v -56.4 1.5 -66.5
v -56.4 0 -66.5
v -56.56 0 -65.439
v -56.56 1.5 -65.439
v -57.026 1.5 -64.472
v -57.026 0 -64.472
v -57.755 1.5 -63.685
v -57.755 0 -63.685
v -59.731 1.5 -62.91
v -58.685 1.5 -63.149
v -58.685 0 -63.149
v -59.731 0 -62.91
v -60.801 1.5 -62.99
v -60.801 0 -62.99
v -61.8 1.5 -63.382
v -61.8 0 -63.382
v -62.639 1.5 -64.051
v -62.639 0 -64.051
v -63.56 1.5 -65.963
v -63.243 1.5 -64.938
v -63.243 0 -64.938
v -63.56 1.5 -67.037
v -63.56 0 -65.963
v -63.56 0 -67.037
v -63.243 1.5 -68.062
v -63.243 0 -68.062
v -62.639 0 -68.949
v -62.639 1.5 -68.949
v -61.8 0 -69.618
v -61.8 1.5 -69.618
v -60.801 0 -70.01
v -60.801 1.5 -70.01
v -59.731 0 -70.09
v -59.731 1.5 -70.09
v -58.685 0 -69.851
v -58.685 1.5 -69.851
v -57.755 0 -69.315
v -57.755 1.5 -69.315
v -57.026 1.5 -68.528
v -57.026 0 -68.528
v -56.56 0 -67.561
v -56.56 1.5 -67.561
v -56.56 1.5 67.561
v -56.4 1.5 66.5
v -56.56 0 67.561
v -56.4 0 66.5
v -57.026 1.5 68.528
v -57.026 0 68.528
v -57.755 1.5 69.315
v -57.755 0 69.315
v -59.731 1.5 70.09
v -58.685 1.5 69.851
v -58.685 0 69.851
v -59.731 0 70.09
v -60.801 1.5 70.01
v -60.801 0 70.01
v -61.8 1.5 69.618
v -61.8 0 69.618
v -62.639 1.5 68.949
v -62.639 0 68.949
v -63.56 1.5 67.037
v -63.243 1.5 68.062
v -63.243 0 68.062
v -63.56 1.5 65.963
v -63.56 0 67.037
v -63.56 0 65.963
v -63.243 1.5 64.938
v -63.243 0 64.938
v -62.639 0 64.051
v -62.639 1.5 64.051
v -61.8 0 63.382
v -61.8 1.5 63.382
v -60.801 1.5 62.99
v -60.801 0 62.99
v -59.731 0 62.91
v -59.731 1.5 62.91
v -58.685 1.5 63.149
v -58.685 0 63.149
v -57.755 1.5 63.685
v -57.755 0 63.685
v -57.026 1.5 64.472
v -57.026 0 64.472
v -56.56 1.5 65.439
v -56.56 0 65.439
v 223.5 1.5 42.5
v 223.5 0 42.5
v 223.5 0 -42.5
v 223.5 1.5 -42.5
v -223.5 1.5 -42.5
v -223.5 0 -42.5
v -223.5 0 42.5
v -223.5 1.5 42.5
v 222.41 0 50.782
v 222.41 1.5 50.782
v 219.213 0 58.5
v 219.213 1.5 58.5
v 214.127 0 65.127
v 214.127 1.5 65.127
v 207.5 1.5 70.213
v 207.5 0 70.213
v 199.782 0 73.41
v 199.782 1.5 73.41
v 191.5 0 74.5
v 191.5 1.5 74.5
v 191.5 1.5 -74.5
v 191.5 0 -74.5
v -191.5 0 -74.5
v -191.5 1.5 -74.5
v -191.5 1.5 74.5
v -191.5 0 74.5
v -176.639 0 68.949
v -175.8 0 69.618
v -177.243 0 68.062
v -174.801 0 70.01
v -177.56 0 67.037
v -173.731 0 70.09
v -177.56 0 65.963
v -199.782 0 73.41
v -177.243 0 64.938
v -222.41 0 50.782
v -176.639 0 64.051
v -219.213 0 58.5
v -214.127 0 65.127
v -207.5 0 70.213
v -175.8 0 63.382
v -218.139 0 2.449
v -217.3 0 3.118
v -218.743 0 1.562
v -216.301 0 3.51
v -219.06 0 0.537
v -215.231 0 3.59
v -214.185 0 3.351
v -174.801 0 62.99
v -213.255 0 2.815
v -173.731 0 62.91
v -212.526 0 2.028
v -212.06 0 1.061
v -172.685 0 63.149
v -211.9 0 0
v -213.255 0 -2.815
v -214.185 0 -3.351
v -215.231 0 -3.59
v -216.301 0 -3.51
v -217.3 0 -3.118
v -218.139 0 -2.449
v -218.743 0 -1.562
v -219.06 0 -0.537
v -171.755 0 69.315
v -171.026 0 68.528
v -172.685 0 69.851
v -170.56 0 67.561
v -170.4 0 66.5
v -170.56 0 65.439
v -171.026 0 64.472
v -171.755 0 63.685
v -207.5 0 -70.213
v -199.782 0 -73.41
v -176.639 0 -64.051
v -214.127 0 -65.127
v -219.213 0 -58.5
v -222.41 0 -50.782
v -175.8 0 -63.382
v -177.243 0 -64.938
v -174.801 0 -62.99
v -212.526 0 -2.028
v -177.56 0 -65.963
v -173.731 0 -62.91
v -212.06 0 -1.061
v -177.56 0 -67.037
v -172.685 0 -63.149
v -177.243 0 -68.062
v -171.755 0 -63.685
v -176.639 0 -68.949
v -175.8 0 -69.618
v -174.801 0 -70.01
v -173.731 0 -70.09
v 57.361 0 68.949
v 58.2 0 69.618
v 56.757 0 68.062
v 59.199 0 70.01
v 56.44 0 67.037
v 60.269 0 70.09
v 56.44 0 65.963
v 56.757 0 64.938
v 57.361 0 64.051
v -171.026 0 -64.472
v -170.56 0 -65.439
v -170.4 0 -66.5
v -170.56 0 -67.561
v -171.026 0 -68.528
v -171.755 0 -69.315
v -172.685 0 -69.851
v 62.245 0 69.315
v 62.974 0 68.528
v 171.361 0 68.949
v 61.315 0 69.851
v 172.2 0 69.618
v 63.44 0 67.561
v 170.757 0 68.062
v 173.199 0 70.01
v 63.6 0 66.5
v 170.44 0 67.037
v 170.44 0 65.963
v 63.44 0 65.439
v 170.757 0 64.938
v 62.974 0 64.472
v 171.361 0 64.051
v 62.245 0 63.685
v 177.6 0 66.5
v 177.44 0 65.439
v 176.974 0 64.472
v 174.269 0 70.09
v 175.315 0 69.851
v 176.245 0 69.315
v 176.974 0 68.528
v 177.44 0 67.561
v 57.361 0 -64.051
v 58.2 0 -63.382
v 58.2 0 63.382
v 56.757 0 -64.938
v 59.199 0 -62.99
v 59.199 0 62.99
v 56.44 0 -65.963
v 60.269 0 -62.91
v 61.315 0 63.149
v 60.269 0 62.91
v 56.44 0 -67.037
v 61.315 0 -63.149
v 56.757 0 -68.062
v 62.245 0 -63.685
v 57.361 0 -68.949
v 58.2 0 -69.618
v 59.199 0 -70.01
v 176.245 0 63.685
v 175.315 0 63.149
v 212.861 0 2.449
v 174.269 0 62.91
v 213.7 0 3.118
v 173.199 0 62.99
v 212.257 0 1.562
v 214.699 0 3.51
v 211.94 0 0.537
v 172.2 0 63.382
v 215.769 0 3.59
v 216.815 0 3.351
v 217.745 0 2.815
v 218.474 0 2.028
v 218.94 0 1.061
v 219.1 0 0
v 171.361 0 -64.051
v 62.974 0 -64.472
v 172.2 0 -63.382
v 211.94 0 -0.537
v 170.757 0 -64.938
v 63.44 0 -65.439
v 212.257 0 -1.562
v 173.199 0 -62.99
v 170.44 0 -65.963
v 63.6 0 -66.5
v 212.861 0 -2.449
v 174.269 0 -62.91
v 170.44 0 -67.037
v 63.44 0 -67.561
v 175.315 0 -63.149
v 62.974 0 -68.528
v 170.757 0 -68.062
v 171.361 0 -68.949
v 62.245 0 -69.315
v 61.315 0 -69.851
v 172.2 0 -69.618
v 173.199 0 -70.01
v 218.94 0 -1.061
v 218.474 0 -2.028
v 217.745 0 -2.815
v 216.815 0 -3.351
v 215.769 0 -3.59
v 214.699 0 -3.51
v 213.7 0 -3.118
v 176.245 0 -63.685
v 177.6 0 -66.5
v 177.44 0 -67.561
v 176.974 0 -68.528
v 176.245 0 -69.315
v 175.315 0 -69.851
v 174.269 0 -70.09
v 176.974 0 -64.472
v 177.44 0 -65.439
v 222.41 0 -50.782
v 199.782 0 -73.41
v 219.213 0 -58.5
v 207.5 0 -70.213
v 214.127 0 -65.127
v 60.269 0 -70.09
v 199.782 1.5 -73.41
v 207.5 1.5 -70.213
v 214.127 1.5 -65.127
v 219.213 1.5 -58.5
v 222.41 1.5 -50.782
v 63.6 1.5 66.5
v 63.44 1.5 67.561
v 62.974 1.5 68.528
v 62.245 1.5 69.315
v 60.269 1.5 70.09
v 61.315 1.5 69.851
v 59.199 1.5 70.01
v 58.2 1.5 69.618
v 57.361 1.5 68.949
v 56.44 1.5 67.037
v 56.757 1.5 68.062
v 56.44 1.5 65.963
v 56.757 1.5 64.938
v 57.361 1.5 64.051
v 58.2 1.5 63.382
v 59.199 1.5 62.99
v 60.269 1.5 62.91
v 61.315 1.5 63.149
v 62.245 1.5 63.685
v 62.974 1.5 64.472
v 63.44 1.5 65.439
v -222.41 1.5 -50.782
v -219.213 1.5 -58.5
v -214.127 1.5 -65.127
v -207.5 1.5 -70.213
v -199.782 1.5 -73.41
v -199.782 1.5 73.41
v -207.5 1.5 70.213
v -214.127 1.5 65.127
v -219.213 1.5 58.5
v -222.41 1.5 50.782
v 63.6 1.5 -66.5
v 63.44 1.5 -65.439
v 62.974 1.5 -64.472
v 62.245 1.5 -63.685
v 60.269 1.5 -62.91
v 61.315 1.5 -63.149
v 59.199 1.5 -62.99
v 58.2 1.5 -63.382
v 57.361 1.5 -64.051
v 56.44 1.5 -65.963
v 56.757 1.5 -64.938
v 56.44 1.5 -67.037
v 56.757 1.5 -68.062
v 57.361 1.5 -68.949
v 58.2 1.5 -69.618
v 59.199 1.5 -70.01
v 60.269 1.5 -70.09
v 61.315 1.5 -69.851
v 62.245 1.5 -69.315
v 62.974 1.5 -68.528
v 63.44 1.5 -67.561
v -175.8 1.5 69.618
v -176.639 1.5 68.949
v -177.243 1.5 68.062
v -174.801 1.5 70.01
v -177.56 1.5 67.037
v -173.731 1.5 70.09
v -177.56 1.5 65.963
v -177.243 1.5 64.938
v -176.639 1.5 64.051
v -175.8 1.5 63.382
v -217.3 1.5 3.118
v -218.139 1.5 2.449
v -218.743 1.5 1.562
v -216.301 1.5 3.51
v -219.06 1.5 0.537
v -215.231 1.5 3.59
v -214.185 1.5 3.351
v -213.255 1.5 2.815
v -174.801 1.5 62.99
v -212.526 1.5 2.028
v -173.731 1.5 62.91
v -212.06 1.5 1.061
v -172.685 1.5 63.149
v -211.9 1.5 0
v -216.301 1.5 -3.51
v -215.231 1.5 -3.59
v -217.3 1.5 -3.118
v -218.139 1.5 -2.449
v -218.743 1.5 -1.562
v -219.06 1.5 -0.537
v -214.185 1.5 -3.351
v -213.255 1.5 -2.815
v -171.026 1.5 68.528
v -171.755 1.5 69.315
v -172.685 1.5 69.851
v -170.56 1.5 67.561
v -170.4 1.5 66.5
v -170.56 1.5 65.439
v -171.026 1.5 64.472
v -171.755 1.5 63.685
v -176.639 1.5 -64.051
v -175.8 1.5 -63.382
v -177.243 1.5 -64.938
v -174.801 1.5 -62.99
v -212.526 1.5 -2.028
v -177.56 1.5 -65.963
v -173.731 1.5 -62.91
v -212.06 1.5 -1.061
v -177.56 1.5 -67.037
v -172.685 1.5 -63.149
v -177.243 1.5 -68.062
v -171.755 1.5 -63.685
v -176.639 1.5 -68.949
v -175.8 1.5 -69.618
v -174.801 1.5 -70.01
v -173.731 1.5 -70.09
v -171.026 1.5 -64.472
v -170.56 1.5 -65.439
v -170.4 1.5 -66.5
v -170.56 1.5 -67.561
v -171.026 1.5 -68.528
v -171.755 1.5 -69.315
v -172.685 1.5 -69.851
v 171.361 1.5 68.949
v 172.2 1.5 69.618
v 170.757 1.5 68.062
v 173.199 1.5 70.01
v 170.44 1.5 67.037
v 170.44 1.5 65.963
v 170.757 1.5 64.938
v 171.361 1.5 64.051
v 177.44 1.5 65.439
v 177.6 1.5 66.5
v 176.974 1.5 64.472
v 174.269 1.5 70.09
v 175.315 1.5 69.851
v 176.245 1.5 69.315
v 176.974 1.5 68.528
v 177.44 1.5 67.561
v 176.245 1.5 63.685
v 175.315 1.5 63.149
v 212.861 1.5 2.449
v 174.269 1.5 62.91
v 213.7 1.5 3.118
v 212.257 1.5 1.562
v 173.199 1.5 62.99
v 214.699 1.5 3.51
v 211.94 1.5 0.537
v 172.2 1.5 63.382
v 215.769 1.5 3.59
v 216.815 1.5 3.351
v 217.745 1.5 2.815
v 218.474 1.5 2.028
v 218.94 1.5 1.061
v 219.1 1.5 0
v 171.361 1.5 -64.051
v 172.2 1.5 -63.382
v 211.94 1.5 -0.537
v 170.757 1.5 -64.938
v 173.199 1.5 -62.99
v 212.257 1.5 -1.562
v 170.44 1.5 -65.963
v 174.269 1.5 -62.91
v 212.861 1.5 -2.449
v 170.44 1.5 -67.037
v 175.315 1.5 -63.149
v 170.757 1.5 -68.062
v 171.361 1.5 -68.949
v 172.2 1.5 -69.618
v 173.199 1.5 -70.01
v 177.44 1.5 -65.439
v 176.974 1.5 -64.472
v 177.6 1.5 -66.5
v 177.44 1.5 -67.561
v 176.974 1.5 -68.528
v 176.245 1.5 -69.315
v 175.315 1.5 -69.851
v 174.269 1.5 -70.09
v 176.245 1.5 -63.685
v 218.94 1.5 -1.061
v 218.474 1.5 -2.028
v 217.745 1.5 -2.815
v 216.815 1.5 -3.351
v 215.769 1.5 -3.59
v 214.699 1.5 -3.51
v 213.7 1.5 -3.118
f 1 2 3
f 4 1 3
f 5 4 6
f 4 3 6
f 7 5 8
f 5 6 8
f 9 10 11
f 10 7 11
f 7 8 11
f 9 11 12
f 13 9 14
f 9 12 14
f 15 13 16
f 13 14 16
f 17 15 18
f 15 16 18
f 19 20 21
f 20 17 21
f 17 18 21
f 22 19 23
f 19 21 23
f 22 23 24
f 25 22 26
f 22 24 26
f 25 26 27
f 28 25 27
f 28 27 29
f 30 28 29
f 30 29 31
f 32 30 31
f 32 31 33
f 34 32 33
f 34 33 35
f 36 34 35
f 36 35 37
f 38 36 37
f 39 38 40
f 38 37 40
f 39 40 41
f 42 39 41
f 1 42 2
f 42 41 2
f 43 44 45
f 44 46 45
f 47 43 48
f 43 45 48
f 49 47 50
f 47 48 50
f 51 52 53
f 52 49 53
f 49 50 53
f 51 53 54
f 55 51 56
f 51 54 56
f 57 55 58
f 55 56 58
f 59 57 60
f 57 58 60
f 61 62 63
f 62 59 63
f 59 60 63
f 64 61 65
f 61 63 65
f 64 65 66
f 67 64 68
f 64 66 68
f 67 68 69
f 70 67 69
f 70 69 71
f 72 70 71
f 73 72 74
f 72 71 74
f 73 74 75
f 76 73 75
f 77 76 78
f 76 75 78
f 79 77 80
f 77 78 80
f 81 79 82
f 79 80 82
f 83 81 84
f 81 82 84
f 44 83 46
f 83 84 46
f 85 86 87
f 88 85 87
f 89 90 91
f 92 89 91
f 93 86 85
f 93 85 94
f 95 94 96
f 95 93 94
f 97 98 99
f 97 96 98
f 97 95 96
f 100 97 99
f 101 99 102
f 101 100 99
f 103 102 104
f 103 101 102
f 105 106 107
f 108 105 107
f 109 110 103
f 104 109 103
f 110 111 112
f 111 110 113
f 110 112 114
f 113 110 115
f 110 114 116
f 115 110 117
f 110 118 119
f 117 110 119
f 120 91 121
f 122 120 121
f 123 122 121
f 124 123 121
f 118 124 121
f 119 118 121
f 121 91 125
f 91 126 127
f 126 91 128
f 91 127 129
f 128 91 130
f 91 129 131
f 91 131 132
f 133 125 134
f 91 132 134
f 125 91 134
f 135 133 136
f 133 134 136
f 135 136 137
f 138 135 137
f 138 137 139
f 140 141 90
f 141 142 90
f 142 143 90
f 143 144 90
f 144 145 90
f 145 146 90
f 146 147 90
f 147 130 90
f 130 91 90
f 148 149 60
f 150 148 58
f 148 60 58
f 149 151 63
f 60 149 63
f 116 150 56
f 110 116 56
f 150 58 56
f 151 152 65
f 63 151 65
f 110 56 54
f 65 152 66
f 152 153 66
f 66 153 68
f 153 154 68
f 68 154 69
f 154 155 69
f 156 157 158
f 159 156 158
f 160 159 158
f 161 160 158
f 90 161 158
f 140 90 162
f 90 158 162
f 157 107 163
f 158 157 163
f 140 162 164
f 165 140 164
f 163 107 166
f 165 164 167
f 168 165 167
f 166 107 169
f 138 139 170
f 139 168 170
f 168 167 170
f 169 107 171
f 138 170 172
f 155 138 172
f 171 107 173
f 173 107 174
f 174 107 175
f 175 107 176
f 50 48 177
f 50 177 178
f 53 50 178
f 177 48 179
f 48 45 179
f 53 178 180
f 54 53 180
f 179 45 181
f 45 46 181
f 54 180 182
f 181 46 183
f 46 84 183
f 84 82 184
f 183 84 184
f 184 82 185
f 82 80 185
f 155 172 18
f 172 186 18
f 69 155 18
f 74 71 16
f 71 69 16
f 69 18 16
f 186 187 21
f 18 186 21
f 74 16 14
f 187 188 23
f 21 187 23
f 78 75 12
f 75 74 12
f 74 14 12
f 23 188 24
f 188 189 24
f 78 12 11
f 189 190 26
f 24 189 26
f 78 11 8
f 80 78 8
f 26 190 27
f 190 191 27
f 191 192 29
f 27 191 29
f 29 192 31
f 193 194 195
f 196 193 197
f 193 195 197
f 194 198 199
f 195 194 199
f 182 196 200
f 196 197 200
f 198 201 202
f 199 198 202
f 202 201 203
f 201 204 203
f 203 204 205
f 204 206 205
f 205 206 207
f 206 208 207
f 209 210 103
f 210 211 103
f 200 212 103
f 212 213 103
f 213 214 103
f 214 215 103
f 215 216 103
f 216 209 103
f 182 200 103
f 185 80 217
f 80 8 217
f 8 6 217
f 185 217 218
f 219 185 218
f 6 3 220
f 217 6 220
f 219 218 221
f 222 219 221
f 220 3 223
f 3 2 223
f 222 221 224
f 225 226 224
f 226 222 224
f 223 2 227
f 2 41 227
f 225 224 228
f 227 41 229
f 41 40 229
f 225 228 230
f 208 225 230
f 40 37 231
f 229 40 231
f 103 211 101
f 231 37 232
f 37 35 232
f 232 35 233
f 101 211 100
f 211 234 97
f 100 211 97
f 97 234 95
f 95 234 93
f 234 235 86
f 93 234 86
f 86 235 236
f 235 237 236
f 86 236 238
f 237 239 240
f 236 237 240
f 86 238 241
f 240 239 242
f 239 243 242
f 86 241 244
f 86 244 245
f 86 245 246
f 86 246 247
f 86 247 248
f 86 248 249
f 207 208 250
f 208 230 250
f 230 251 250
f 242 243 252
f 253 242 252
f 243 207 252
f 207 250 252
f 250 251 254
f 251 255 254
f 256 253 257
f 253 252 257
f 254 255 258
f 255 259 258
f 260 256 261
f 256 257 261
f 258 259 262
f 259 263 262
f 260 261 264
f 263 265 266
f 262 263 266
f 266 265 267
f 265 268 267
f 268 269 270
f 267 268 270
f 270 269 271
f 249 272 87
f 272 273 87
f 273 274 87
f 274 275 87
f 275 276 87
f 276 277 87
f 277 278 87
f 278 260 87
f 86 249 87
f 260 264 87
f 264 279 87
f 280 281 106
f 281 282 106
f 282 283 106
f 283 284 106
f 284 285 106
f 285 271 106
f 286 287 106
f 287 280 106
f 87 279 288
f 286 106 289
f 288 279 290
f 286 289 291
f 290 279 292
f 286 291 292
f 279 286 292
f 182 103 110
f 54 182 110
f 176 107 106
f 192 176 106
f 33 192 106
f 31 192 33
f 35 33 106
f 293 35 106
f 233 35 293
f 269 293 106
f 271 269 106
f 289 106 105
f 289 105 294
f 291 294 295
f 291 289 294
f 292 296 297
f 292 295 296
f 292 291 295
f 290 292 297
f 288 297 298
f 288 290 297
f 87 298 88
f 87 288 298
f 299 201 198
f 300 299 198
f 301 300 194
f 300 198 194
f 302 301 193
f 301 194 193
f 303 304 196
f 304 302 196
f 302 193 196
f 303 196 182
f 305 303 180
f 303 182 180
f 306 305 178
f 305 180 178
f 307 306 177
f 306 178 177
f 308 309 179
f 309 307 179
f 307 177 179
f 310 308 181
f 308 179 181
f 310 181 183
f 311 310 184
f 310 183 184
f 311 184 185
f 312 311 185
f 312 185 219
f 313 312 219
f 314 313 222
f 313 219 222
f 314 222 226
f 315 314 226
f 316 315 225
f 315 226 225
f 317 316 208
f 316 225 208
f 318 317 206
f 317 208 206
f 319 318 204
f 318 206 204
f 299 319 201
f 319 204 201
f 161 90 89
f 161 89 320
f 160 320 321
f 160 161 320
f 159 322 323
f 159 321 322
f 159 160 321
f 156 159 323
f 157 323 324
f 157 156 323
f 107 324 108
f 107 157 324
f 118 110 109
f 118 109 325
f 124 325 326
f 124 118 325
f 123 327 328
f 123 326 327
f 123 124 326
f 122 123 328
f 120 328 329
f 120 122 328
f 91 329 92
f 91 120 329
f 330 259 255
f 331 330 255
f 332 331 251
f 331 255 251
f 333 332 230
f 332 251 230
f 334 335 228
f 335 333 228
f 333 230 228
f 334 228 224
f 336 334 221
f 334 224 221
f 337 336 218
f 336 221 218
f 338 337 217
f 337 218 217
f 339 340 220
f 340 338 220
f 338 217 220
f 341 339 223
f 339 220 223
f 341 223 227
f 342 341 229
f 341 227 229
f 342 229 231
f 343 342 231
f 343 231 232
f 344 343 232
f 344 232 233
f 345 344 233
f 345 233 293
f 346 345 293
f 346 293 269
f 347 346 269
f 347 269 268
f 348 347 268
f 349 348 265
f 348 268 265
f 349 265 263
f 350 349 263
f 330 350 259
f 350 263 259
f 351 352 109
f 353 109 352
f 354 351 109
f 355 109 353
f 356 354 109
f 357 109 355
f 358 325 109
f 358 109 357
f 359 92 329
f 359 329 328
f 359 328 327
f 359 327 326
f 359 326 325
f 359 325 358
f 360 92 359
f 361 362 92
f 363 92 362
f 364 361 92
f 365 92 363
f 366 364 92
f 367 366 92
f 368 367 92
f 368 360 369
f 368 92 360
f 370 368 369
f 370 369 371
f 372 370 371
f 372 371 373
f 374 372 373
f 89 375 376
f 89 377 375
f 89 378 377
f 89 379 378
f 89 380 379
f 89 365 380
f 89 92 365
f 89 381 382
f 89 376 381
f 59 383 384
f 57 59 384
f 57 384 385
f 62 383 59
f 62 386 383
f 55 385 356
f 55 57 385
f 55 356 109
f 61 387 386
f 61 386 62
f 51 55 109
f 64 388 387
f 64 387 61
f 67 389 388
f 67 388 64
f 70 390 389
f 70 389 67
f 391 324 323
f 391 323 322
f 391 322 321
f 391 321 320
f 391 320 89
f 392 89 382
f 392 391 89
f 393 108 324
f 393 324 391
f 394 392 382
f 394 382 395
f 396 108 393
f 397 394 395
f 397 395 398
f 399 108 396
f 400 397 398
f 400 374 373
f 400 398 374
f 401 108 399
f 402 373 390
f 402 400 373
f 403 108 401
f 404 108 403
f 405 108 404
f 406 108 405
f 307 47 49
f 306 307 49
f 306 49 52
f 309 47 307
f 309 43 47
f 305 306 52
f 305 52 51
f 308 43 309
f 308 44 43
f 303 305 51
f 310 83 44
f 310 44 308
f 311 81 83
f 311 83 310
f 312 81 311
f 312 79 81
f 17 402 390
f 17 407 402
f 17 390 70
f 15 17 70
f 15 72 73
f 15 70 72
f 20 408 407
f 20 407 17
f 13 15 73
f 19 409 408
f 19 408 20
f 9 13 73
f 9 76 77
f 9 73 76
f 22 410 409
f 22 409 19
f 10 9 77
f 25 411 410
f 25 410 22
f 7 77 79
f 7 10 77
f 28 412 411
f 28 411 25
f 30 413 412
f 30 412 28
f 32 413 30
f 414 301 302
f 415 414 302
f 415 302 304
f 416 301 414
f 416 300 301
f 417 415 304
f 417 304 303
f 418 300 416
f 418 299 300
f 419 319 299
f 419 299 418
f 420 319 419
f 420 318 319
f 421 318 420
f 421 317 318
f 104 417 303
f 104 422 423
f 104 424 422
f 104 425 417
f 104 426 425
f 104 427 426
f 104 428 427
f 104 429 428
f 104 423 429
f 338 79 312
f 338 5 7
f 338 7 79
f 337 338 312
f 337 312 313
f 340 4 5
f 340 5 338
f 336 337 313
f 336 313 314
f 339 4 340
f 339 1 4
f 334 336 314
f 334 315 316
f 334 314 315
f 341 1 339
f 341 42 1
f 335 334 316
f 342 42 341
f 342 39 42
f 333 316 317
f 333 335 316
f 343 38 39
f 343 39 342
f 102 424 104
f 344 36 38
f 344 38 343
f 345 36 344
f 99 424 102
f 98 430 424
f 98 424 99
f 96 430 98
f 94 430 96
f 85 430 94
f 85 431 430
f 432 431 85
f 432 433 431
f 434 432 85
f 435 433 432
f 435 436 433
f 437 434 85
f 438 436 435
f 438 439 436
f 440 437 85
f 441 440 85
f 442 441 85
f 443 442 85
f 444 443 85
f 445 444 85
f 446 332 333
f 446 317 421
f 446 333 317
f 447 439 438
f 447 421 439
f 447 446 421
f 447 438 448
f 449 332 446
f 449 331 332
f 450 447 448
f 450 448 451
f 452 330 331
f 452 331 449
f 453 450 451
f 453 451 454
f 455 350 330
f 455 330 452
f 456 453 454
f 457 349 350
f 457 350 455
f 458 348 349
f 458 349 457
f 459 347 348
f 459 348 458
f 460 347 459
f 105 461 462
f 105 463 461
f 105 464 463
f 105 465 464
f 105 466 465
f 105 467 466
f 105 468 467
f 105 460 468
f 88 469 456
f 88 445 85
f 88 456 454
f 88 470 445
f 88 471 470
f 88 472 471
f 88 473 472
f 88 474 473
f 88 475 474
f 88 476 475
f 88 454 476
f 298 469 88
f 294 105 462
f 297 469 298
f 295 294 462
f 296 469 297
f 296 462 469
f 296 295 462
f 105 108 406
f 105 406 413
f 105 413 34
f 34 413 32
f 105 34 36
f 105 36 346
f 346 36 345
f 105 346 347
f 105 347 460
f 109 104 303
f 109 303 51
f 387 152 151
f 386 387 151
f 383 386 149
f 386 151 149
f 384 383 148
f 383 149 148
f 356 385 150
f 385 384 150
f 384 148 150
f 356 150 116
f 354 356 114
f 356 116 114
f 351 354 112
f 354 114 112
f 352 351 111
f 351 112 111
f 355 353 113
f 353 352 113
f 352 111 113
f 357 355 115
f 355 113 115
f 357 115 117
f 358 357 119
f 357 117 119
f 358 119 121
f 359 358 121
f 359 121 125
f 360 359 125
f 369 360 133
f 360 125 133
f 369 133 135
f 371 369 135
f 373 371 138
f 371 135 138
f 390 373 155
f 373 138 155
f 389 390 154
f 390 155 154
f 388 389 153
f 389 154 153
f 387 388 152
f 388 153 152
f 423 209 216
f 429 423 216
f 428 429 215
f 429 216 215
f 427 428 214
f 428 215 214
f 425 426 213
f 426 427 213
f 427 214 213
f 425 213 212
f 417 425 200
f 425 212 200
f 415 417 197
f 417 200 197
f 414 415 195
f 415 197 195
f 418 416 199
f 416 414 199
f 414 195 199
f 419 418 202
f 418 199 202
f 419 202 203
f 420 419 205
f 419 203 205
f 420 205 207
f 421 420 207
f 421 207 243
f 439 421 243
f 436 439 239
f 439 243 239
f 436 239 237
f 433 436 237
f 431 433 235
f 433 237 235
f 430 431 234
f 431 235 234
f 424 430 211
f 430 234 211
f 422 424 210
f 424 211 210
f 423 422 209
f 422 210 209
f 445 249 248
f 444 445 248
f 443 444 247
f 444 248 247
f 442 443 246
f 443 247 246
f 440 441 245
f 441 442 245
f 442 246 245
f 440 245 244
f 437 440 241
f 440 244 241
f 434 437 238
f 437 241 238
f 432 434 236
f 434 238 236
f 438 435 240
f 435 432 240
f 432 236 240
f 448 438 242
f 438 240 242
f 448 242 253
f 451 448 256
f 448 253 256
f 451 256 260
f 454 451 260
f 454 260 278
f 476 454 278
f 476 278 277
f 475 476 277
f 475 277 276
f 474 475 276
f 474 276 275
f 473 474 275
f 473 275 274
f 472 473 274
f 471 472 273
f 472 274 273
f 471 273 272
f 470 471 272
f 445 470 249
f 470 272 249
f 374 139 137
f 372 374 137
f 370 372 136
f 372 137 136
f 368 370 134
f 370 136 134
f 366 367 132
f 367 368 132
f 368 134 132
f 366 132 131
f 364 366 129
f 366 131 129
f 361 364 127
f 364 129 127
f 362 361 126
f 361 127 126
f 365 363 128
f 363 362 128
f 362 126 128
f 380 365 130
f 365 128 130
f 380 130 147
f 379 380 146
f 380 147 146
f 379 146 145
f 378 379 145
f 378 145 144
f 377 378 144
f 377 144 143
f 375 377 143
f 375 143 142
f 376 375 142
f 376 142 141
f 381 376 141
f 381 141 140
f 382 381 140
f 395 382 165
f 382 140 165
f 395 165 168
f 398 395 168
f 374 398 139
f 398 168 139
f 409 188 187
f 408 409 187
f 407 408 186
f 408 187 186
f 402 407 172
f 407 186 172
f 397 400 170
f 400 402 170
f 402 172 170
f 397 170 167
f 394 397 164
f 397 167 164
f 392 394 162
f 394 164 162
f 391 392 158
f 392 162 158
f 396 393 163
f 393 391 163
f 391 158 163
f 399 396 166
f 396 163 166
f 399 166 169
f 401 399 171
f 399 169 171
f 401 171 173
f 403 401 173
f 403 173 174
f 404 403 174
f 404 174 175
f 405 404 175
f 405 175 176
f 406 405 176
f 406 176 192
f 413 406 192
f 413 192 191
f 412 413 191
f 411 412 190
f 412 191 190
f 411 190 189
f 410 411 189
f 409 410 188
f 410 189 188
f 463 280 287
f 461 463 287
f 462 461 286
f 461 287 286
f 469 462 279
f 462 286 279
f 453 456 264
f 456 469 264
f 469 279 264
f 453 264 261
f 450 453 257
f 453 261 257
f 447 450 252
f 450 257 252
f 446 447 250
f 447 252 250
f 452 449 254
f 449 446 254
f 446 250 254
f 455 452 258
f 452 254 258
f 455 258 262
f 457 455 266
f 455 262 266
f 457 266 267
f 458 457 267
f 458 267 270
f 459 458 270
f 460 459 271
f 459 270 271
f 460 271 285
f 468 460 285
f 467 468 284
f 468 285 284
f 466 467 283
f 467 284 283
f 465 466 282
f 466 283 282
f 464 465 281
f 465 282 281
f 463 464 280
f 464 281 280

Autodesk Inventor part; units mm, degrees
sketch "Sketch_4" plane through (0, 0, 0) normal (0, 1, 0) x (1, 0, 0)
  arc A0 (-223.5, -42.5) -> (-191.5, -74.5) centre (-191.5, -42.5) ccw
  line L0 (-191.5, -74.5) -> (191.5, -74.5)
  arc A1 (191.5, -74.5) -> (223.5, -42.5) centre (191.5, -42.5) ccw
  line L1 (223.5, -42.5) -> (223.5, 42.5)
  arc A2 (223.5, 42.5) -> (191.5, 74.5) centre (191.5, 42.5) ccw
  line L2 (191.5, 74.5) -> (-191.5, 74.5)
  arc A3 (-191.5, 74.5) -> (-223.5, 42.5) centre (-191.5, 42.5) ccw
  line L3 (-223.5, 42.5) -> (-223.5, -42.5)
  circle A4 centre (215.5, 0) radius 3.6
  circle A5 centre (174, -66.5) radius 3.6
  circle A6 centre (174, 66.5) radius 3.6
  circle A7 centre (60, -66.5) radius 3.6
  circle A8 centre (60, 66.5) radius 3.6
  circle A9 centre (-60, -66.5) radius 3.6
  circle A10 centre (-60, 66.5) radius 3.6
  circle A11 centre (-174, -66.5) radius 3.6
  circle A12 centre (-174, 66.5) radius 3.6
  circle A13 centre (-215.5, 0) radius 3.6
extrude "Extrusion1" add sketch "Sketch_4" along normal blind 1.5
ref_plane "FP_XY" through (0, 0, 0) normal (0, -1, 0) x (1, 0, 0)
ref_plane "FP_YZ" through (0, 0, 0) normal (1, 0, 0) x (0, 0, 1)
ref_plane "FP_ZX" through (0, 0, 0) normal (0, 0, 1) x (0, -1, 0)
ref_plane "to_Bolt_1_XY" through (-215.5, 0, 0) normal (0, 1, 0) x (1, 0, 0)
ref_plane "to_Bolt_1_YZ" through (-215.5, 0, 0) normal (1, 0, 0) x (0, 0, -1)
ref_plane "to_Bolt_1_ZX" through (-215.5, 0, 0) normal (0, 0, -1) x (0, 1, 0)
ref_plane "to_Bolt_1_1_XY" through (-174, 0, -66.5) normal (0, 1, 0) x (1, 0, 0)
ref_plane "to_Bolt_1_1_YZ" through (-174, 0, -66.5) normal (1, 0, 0) x (0, 0, -1)
ref_plane "to_Bolt_1_1_ZX" through (-174, 0, -66.5) normal (0, 0, -1) x (0, 1, 0)
ref_plane "to_Bolt_1_2_XY" through (-60, 0, -66.5) normal (0, 1, 0) x (1, 0, 0)
ref_plane "to_Bolt_1_2_YZ" through (-60, 0, -66.5) normal (1, 0, 0) x (0, 0, -1)
ref_plane "to_Bolt_1_2_ZX" through (-60, 0, -66.5) normal (0, 0, -1) x (0, 1, 0)
ref_plane "to_Bolt_1_3_XY" through (60, 0, -66.5) normal (0, 1, 0) x (1, 0, 0)
ref_plane "to_Bolt_1_3_YZ" through (60, 0, -66.5) normal (1, 0, 0) x (0, 0, -1)
ref_plane "to_Bolt_1_3_ZX" through (60, 0, -66.5) normal (0, 0, -1) x (0, 1, 0)
ref_plane "to_Bolt_1_4_XY" through (174, 0, -66.5) normal (0, 1, 0) x (1, 0, 0)
ref_plane "to_Bolt_1_4_YZ" through (174, 0, -66.5) normal (1, 0, 0) x (0, 0, -1)
ref_plane "to_Bolt_1_4_ZX" through (174, 0, -66.5) normal (0, 0, -1) x (0, 1, 0)
ref_plane "to_Bolt_1_5_XY" through (-174, 0, 66.5) normal (0, 1, 0) x (1, 0, 0)
ref_plane "to_Bolt_1_5_YZ" through (-174, 0, 66.5) normal (1, 0, 0) x (0, 0, -1)
ref_plane "to_Bolt_1_5_ZX" through (-174, 0, 66.5) normal (0, 0, -1) x (0, 1, 0)
ref_plane "to_Bolt_1_6_XY" through (-60, 0, 66.5) normal (0, 1, 0) x (1, 0, 0)
ref_plane "to_Bolt_1_6_YZ" through (-60, 0, 66.5) normal (1, 0, 0) x (0, 0, -1)
ref_plane "to_Bolt_1_6_ZX" through (-60, 0, 66.5) normal (0, 0, -1) x (0, 1, 0)
ref_plane "to_Bolt_1_7_XY" through (60, 0, 66.5) normal (0, 1, 0) x (1, 0, 0)
ref_plane "to_Bolt_1_7_YZ" through (60, 0, 66.5) normal (1, 0, 0) x (0, 0, -1)
ref_plane "to_Bolt_1_7_ZX" through (60, 0, 66.5) normal (0, 0, -1) x (0, 1, 0)
ref_plane "to_Bolt_1_8_XY" through (174, 0, 66.5) normal (0, 1, 0) x (1, 0, 0)
ref_plane "to_Bolt_1_8_YZ" through (174, 0, 66.5) normal (1, 0, 0) x (0, 0, -1)
ref_plane "to_Bolt_1_8_ZX" through (174, 0, 66.5) normal (0, 0, -1) x (0, 1, 0)
ref_plane "to_Bolt_2_XY" through (215.5, 0, 0) normal (0, 1, 0) x (1, 0, 0)
ref_plane "to_Bolt_2_YZ" through (215.5, 0, 0) normal (1, 0, 0) x (0, 0, -1)
ref_plane "to_Bolt_2_ZX" through (215.5, 0, 0) normal (0, 0, -1) x (0, 1, 0)
properties part number "1XX4_04_00_4(1)_P5"
